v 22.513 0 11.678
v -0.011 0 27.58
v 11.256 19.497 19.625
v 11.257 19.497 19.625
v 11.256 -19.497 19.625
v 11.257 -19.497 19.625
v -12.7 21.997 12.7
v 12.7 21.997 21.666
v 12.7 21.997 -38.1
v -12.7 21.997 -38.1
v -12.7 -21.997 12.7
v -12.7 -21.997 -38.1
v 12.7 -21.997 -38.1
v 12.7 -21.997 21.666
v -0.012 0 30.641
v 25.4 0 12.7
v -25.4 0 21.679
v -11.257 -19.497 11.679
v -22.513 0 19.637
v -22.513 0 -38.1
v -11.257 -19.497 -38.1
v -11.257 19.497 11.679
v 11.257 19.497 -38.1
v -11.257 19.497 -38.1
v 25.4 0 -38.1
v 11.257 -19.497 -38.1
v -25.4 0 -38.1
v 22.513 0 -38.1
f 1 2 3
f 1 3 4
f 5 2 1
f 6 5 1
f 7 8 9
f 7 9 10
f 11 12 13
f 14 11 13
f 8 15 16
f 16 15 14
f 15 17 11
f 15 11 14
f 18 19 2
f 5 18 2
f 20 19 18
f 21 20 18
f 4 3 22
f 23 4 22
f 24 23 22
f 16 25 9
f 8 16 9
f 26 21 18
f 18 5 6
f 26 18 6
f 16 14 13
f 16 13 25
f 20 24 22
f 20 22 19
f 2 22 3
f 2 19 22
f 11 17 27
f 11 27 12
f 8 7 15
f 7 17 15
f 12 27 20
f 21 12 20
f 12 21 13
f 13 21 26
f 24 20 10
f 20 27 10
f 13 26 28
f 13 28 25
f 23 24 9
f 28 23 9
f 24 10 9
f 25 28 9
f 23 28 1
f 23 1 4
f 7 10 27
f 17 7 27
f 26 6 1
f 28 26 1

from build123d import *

# Parameters (mm, degrees)
F1_DEPTH  = 38.1
F8_W      = 62.1289778501
F8_H      = 70.9990356117
F9_DEPTH  = 24.4074275016
F10_W     = 94.4273807108
F10_H     = 95.7268364727
F11_DEPTH = 24.4074275016
F12_W     = 81.8659365177
F12_H     = 67.1387314796
F13_DEPTH = 20.7508335567
F14_T     = -2.5


with BuildPart() as f1:
    # F0 (on Top) → F1 (new body, symmetric)
    with BuildSketch(Plane.XY):
        Polygon((12.7, 21.9970452561), (-12.7, 21.9970452561), (-25.4, 0), (-12.7, -21.9970452561), (12.7, -21.9970452561), (25.4, 0), align=None)
    extrude(amount=F1_DEPTH, both=True)

    # F8 (on 3pt) → F9 (cut, through all)
    with BuildSketch(Plane(origin=(-7.2159394472, 12.5101757995, 20.4417548078), x_dir=(0.9575384102, 0.1504945841, 0.2459096848), z_dir=(0.2883057283, -0.4998317088, -0.8167301084))):
        with Locations((4.8328703269, 13.4997954592)):
            Rectangle(F8_W, F8_H)
    extrude(amount=-F9_DEPTH, mode=Mode.SUBTRACT)

    # F10 (on 3pt) → F11 (cut, through all)
    with BuildSketch(Plane(origin=(-7.2159394472, -12.5101757995, 20.4417548078), x_dir=(0.9575384102, -0.1504945841, 0.2459096848), z_dir=(0.2883057283, 0.4998317088, -0.8167301084))):
        with Locations((0.9678620845, 0.6989594549)):
            Rectangle(F10_W, F10_H)
    extrude(amount=-F11_DEPTH, mode=Mode.SUBTRACT)

    # F12 (on 3pt) → F13 (cut, through all)
    with BuildSketch(Plane(origin=(14.4326980932, 0, 20.4429151462), x_dir=(0.816922581, 0, -0.5767473422), z_dir=(-0.5767473422, 0, -0.816922581))):
        with Locations((5.5516734719, -0.7580146194)):
            Rectangle(F12_W, F12_H)
    extrude(amount=-F13_DEPTH, mode=Mode.SUBTRACT)

    # F14
    f14_openings = [f1.faces().sort_by_distance(p)[0] for p in [
        (0, 0, -38.1),
    ]]
    offset(amount=F14_T, openings=f14_openings, kind=Kind.INTERSECTION)


solid = f1.part
